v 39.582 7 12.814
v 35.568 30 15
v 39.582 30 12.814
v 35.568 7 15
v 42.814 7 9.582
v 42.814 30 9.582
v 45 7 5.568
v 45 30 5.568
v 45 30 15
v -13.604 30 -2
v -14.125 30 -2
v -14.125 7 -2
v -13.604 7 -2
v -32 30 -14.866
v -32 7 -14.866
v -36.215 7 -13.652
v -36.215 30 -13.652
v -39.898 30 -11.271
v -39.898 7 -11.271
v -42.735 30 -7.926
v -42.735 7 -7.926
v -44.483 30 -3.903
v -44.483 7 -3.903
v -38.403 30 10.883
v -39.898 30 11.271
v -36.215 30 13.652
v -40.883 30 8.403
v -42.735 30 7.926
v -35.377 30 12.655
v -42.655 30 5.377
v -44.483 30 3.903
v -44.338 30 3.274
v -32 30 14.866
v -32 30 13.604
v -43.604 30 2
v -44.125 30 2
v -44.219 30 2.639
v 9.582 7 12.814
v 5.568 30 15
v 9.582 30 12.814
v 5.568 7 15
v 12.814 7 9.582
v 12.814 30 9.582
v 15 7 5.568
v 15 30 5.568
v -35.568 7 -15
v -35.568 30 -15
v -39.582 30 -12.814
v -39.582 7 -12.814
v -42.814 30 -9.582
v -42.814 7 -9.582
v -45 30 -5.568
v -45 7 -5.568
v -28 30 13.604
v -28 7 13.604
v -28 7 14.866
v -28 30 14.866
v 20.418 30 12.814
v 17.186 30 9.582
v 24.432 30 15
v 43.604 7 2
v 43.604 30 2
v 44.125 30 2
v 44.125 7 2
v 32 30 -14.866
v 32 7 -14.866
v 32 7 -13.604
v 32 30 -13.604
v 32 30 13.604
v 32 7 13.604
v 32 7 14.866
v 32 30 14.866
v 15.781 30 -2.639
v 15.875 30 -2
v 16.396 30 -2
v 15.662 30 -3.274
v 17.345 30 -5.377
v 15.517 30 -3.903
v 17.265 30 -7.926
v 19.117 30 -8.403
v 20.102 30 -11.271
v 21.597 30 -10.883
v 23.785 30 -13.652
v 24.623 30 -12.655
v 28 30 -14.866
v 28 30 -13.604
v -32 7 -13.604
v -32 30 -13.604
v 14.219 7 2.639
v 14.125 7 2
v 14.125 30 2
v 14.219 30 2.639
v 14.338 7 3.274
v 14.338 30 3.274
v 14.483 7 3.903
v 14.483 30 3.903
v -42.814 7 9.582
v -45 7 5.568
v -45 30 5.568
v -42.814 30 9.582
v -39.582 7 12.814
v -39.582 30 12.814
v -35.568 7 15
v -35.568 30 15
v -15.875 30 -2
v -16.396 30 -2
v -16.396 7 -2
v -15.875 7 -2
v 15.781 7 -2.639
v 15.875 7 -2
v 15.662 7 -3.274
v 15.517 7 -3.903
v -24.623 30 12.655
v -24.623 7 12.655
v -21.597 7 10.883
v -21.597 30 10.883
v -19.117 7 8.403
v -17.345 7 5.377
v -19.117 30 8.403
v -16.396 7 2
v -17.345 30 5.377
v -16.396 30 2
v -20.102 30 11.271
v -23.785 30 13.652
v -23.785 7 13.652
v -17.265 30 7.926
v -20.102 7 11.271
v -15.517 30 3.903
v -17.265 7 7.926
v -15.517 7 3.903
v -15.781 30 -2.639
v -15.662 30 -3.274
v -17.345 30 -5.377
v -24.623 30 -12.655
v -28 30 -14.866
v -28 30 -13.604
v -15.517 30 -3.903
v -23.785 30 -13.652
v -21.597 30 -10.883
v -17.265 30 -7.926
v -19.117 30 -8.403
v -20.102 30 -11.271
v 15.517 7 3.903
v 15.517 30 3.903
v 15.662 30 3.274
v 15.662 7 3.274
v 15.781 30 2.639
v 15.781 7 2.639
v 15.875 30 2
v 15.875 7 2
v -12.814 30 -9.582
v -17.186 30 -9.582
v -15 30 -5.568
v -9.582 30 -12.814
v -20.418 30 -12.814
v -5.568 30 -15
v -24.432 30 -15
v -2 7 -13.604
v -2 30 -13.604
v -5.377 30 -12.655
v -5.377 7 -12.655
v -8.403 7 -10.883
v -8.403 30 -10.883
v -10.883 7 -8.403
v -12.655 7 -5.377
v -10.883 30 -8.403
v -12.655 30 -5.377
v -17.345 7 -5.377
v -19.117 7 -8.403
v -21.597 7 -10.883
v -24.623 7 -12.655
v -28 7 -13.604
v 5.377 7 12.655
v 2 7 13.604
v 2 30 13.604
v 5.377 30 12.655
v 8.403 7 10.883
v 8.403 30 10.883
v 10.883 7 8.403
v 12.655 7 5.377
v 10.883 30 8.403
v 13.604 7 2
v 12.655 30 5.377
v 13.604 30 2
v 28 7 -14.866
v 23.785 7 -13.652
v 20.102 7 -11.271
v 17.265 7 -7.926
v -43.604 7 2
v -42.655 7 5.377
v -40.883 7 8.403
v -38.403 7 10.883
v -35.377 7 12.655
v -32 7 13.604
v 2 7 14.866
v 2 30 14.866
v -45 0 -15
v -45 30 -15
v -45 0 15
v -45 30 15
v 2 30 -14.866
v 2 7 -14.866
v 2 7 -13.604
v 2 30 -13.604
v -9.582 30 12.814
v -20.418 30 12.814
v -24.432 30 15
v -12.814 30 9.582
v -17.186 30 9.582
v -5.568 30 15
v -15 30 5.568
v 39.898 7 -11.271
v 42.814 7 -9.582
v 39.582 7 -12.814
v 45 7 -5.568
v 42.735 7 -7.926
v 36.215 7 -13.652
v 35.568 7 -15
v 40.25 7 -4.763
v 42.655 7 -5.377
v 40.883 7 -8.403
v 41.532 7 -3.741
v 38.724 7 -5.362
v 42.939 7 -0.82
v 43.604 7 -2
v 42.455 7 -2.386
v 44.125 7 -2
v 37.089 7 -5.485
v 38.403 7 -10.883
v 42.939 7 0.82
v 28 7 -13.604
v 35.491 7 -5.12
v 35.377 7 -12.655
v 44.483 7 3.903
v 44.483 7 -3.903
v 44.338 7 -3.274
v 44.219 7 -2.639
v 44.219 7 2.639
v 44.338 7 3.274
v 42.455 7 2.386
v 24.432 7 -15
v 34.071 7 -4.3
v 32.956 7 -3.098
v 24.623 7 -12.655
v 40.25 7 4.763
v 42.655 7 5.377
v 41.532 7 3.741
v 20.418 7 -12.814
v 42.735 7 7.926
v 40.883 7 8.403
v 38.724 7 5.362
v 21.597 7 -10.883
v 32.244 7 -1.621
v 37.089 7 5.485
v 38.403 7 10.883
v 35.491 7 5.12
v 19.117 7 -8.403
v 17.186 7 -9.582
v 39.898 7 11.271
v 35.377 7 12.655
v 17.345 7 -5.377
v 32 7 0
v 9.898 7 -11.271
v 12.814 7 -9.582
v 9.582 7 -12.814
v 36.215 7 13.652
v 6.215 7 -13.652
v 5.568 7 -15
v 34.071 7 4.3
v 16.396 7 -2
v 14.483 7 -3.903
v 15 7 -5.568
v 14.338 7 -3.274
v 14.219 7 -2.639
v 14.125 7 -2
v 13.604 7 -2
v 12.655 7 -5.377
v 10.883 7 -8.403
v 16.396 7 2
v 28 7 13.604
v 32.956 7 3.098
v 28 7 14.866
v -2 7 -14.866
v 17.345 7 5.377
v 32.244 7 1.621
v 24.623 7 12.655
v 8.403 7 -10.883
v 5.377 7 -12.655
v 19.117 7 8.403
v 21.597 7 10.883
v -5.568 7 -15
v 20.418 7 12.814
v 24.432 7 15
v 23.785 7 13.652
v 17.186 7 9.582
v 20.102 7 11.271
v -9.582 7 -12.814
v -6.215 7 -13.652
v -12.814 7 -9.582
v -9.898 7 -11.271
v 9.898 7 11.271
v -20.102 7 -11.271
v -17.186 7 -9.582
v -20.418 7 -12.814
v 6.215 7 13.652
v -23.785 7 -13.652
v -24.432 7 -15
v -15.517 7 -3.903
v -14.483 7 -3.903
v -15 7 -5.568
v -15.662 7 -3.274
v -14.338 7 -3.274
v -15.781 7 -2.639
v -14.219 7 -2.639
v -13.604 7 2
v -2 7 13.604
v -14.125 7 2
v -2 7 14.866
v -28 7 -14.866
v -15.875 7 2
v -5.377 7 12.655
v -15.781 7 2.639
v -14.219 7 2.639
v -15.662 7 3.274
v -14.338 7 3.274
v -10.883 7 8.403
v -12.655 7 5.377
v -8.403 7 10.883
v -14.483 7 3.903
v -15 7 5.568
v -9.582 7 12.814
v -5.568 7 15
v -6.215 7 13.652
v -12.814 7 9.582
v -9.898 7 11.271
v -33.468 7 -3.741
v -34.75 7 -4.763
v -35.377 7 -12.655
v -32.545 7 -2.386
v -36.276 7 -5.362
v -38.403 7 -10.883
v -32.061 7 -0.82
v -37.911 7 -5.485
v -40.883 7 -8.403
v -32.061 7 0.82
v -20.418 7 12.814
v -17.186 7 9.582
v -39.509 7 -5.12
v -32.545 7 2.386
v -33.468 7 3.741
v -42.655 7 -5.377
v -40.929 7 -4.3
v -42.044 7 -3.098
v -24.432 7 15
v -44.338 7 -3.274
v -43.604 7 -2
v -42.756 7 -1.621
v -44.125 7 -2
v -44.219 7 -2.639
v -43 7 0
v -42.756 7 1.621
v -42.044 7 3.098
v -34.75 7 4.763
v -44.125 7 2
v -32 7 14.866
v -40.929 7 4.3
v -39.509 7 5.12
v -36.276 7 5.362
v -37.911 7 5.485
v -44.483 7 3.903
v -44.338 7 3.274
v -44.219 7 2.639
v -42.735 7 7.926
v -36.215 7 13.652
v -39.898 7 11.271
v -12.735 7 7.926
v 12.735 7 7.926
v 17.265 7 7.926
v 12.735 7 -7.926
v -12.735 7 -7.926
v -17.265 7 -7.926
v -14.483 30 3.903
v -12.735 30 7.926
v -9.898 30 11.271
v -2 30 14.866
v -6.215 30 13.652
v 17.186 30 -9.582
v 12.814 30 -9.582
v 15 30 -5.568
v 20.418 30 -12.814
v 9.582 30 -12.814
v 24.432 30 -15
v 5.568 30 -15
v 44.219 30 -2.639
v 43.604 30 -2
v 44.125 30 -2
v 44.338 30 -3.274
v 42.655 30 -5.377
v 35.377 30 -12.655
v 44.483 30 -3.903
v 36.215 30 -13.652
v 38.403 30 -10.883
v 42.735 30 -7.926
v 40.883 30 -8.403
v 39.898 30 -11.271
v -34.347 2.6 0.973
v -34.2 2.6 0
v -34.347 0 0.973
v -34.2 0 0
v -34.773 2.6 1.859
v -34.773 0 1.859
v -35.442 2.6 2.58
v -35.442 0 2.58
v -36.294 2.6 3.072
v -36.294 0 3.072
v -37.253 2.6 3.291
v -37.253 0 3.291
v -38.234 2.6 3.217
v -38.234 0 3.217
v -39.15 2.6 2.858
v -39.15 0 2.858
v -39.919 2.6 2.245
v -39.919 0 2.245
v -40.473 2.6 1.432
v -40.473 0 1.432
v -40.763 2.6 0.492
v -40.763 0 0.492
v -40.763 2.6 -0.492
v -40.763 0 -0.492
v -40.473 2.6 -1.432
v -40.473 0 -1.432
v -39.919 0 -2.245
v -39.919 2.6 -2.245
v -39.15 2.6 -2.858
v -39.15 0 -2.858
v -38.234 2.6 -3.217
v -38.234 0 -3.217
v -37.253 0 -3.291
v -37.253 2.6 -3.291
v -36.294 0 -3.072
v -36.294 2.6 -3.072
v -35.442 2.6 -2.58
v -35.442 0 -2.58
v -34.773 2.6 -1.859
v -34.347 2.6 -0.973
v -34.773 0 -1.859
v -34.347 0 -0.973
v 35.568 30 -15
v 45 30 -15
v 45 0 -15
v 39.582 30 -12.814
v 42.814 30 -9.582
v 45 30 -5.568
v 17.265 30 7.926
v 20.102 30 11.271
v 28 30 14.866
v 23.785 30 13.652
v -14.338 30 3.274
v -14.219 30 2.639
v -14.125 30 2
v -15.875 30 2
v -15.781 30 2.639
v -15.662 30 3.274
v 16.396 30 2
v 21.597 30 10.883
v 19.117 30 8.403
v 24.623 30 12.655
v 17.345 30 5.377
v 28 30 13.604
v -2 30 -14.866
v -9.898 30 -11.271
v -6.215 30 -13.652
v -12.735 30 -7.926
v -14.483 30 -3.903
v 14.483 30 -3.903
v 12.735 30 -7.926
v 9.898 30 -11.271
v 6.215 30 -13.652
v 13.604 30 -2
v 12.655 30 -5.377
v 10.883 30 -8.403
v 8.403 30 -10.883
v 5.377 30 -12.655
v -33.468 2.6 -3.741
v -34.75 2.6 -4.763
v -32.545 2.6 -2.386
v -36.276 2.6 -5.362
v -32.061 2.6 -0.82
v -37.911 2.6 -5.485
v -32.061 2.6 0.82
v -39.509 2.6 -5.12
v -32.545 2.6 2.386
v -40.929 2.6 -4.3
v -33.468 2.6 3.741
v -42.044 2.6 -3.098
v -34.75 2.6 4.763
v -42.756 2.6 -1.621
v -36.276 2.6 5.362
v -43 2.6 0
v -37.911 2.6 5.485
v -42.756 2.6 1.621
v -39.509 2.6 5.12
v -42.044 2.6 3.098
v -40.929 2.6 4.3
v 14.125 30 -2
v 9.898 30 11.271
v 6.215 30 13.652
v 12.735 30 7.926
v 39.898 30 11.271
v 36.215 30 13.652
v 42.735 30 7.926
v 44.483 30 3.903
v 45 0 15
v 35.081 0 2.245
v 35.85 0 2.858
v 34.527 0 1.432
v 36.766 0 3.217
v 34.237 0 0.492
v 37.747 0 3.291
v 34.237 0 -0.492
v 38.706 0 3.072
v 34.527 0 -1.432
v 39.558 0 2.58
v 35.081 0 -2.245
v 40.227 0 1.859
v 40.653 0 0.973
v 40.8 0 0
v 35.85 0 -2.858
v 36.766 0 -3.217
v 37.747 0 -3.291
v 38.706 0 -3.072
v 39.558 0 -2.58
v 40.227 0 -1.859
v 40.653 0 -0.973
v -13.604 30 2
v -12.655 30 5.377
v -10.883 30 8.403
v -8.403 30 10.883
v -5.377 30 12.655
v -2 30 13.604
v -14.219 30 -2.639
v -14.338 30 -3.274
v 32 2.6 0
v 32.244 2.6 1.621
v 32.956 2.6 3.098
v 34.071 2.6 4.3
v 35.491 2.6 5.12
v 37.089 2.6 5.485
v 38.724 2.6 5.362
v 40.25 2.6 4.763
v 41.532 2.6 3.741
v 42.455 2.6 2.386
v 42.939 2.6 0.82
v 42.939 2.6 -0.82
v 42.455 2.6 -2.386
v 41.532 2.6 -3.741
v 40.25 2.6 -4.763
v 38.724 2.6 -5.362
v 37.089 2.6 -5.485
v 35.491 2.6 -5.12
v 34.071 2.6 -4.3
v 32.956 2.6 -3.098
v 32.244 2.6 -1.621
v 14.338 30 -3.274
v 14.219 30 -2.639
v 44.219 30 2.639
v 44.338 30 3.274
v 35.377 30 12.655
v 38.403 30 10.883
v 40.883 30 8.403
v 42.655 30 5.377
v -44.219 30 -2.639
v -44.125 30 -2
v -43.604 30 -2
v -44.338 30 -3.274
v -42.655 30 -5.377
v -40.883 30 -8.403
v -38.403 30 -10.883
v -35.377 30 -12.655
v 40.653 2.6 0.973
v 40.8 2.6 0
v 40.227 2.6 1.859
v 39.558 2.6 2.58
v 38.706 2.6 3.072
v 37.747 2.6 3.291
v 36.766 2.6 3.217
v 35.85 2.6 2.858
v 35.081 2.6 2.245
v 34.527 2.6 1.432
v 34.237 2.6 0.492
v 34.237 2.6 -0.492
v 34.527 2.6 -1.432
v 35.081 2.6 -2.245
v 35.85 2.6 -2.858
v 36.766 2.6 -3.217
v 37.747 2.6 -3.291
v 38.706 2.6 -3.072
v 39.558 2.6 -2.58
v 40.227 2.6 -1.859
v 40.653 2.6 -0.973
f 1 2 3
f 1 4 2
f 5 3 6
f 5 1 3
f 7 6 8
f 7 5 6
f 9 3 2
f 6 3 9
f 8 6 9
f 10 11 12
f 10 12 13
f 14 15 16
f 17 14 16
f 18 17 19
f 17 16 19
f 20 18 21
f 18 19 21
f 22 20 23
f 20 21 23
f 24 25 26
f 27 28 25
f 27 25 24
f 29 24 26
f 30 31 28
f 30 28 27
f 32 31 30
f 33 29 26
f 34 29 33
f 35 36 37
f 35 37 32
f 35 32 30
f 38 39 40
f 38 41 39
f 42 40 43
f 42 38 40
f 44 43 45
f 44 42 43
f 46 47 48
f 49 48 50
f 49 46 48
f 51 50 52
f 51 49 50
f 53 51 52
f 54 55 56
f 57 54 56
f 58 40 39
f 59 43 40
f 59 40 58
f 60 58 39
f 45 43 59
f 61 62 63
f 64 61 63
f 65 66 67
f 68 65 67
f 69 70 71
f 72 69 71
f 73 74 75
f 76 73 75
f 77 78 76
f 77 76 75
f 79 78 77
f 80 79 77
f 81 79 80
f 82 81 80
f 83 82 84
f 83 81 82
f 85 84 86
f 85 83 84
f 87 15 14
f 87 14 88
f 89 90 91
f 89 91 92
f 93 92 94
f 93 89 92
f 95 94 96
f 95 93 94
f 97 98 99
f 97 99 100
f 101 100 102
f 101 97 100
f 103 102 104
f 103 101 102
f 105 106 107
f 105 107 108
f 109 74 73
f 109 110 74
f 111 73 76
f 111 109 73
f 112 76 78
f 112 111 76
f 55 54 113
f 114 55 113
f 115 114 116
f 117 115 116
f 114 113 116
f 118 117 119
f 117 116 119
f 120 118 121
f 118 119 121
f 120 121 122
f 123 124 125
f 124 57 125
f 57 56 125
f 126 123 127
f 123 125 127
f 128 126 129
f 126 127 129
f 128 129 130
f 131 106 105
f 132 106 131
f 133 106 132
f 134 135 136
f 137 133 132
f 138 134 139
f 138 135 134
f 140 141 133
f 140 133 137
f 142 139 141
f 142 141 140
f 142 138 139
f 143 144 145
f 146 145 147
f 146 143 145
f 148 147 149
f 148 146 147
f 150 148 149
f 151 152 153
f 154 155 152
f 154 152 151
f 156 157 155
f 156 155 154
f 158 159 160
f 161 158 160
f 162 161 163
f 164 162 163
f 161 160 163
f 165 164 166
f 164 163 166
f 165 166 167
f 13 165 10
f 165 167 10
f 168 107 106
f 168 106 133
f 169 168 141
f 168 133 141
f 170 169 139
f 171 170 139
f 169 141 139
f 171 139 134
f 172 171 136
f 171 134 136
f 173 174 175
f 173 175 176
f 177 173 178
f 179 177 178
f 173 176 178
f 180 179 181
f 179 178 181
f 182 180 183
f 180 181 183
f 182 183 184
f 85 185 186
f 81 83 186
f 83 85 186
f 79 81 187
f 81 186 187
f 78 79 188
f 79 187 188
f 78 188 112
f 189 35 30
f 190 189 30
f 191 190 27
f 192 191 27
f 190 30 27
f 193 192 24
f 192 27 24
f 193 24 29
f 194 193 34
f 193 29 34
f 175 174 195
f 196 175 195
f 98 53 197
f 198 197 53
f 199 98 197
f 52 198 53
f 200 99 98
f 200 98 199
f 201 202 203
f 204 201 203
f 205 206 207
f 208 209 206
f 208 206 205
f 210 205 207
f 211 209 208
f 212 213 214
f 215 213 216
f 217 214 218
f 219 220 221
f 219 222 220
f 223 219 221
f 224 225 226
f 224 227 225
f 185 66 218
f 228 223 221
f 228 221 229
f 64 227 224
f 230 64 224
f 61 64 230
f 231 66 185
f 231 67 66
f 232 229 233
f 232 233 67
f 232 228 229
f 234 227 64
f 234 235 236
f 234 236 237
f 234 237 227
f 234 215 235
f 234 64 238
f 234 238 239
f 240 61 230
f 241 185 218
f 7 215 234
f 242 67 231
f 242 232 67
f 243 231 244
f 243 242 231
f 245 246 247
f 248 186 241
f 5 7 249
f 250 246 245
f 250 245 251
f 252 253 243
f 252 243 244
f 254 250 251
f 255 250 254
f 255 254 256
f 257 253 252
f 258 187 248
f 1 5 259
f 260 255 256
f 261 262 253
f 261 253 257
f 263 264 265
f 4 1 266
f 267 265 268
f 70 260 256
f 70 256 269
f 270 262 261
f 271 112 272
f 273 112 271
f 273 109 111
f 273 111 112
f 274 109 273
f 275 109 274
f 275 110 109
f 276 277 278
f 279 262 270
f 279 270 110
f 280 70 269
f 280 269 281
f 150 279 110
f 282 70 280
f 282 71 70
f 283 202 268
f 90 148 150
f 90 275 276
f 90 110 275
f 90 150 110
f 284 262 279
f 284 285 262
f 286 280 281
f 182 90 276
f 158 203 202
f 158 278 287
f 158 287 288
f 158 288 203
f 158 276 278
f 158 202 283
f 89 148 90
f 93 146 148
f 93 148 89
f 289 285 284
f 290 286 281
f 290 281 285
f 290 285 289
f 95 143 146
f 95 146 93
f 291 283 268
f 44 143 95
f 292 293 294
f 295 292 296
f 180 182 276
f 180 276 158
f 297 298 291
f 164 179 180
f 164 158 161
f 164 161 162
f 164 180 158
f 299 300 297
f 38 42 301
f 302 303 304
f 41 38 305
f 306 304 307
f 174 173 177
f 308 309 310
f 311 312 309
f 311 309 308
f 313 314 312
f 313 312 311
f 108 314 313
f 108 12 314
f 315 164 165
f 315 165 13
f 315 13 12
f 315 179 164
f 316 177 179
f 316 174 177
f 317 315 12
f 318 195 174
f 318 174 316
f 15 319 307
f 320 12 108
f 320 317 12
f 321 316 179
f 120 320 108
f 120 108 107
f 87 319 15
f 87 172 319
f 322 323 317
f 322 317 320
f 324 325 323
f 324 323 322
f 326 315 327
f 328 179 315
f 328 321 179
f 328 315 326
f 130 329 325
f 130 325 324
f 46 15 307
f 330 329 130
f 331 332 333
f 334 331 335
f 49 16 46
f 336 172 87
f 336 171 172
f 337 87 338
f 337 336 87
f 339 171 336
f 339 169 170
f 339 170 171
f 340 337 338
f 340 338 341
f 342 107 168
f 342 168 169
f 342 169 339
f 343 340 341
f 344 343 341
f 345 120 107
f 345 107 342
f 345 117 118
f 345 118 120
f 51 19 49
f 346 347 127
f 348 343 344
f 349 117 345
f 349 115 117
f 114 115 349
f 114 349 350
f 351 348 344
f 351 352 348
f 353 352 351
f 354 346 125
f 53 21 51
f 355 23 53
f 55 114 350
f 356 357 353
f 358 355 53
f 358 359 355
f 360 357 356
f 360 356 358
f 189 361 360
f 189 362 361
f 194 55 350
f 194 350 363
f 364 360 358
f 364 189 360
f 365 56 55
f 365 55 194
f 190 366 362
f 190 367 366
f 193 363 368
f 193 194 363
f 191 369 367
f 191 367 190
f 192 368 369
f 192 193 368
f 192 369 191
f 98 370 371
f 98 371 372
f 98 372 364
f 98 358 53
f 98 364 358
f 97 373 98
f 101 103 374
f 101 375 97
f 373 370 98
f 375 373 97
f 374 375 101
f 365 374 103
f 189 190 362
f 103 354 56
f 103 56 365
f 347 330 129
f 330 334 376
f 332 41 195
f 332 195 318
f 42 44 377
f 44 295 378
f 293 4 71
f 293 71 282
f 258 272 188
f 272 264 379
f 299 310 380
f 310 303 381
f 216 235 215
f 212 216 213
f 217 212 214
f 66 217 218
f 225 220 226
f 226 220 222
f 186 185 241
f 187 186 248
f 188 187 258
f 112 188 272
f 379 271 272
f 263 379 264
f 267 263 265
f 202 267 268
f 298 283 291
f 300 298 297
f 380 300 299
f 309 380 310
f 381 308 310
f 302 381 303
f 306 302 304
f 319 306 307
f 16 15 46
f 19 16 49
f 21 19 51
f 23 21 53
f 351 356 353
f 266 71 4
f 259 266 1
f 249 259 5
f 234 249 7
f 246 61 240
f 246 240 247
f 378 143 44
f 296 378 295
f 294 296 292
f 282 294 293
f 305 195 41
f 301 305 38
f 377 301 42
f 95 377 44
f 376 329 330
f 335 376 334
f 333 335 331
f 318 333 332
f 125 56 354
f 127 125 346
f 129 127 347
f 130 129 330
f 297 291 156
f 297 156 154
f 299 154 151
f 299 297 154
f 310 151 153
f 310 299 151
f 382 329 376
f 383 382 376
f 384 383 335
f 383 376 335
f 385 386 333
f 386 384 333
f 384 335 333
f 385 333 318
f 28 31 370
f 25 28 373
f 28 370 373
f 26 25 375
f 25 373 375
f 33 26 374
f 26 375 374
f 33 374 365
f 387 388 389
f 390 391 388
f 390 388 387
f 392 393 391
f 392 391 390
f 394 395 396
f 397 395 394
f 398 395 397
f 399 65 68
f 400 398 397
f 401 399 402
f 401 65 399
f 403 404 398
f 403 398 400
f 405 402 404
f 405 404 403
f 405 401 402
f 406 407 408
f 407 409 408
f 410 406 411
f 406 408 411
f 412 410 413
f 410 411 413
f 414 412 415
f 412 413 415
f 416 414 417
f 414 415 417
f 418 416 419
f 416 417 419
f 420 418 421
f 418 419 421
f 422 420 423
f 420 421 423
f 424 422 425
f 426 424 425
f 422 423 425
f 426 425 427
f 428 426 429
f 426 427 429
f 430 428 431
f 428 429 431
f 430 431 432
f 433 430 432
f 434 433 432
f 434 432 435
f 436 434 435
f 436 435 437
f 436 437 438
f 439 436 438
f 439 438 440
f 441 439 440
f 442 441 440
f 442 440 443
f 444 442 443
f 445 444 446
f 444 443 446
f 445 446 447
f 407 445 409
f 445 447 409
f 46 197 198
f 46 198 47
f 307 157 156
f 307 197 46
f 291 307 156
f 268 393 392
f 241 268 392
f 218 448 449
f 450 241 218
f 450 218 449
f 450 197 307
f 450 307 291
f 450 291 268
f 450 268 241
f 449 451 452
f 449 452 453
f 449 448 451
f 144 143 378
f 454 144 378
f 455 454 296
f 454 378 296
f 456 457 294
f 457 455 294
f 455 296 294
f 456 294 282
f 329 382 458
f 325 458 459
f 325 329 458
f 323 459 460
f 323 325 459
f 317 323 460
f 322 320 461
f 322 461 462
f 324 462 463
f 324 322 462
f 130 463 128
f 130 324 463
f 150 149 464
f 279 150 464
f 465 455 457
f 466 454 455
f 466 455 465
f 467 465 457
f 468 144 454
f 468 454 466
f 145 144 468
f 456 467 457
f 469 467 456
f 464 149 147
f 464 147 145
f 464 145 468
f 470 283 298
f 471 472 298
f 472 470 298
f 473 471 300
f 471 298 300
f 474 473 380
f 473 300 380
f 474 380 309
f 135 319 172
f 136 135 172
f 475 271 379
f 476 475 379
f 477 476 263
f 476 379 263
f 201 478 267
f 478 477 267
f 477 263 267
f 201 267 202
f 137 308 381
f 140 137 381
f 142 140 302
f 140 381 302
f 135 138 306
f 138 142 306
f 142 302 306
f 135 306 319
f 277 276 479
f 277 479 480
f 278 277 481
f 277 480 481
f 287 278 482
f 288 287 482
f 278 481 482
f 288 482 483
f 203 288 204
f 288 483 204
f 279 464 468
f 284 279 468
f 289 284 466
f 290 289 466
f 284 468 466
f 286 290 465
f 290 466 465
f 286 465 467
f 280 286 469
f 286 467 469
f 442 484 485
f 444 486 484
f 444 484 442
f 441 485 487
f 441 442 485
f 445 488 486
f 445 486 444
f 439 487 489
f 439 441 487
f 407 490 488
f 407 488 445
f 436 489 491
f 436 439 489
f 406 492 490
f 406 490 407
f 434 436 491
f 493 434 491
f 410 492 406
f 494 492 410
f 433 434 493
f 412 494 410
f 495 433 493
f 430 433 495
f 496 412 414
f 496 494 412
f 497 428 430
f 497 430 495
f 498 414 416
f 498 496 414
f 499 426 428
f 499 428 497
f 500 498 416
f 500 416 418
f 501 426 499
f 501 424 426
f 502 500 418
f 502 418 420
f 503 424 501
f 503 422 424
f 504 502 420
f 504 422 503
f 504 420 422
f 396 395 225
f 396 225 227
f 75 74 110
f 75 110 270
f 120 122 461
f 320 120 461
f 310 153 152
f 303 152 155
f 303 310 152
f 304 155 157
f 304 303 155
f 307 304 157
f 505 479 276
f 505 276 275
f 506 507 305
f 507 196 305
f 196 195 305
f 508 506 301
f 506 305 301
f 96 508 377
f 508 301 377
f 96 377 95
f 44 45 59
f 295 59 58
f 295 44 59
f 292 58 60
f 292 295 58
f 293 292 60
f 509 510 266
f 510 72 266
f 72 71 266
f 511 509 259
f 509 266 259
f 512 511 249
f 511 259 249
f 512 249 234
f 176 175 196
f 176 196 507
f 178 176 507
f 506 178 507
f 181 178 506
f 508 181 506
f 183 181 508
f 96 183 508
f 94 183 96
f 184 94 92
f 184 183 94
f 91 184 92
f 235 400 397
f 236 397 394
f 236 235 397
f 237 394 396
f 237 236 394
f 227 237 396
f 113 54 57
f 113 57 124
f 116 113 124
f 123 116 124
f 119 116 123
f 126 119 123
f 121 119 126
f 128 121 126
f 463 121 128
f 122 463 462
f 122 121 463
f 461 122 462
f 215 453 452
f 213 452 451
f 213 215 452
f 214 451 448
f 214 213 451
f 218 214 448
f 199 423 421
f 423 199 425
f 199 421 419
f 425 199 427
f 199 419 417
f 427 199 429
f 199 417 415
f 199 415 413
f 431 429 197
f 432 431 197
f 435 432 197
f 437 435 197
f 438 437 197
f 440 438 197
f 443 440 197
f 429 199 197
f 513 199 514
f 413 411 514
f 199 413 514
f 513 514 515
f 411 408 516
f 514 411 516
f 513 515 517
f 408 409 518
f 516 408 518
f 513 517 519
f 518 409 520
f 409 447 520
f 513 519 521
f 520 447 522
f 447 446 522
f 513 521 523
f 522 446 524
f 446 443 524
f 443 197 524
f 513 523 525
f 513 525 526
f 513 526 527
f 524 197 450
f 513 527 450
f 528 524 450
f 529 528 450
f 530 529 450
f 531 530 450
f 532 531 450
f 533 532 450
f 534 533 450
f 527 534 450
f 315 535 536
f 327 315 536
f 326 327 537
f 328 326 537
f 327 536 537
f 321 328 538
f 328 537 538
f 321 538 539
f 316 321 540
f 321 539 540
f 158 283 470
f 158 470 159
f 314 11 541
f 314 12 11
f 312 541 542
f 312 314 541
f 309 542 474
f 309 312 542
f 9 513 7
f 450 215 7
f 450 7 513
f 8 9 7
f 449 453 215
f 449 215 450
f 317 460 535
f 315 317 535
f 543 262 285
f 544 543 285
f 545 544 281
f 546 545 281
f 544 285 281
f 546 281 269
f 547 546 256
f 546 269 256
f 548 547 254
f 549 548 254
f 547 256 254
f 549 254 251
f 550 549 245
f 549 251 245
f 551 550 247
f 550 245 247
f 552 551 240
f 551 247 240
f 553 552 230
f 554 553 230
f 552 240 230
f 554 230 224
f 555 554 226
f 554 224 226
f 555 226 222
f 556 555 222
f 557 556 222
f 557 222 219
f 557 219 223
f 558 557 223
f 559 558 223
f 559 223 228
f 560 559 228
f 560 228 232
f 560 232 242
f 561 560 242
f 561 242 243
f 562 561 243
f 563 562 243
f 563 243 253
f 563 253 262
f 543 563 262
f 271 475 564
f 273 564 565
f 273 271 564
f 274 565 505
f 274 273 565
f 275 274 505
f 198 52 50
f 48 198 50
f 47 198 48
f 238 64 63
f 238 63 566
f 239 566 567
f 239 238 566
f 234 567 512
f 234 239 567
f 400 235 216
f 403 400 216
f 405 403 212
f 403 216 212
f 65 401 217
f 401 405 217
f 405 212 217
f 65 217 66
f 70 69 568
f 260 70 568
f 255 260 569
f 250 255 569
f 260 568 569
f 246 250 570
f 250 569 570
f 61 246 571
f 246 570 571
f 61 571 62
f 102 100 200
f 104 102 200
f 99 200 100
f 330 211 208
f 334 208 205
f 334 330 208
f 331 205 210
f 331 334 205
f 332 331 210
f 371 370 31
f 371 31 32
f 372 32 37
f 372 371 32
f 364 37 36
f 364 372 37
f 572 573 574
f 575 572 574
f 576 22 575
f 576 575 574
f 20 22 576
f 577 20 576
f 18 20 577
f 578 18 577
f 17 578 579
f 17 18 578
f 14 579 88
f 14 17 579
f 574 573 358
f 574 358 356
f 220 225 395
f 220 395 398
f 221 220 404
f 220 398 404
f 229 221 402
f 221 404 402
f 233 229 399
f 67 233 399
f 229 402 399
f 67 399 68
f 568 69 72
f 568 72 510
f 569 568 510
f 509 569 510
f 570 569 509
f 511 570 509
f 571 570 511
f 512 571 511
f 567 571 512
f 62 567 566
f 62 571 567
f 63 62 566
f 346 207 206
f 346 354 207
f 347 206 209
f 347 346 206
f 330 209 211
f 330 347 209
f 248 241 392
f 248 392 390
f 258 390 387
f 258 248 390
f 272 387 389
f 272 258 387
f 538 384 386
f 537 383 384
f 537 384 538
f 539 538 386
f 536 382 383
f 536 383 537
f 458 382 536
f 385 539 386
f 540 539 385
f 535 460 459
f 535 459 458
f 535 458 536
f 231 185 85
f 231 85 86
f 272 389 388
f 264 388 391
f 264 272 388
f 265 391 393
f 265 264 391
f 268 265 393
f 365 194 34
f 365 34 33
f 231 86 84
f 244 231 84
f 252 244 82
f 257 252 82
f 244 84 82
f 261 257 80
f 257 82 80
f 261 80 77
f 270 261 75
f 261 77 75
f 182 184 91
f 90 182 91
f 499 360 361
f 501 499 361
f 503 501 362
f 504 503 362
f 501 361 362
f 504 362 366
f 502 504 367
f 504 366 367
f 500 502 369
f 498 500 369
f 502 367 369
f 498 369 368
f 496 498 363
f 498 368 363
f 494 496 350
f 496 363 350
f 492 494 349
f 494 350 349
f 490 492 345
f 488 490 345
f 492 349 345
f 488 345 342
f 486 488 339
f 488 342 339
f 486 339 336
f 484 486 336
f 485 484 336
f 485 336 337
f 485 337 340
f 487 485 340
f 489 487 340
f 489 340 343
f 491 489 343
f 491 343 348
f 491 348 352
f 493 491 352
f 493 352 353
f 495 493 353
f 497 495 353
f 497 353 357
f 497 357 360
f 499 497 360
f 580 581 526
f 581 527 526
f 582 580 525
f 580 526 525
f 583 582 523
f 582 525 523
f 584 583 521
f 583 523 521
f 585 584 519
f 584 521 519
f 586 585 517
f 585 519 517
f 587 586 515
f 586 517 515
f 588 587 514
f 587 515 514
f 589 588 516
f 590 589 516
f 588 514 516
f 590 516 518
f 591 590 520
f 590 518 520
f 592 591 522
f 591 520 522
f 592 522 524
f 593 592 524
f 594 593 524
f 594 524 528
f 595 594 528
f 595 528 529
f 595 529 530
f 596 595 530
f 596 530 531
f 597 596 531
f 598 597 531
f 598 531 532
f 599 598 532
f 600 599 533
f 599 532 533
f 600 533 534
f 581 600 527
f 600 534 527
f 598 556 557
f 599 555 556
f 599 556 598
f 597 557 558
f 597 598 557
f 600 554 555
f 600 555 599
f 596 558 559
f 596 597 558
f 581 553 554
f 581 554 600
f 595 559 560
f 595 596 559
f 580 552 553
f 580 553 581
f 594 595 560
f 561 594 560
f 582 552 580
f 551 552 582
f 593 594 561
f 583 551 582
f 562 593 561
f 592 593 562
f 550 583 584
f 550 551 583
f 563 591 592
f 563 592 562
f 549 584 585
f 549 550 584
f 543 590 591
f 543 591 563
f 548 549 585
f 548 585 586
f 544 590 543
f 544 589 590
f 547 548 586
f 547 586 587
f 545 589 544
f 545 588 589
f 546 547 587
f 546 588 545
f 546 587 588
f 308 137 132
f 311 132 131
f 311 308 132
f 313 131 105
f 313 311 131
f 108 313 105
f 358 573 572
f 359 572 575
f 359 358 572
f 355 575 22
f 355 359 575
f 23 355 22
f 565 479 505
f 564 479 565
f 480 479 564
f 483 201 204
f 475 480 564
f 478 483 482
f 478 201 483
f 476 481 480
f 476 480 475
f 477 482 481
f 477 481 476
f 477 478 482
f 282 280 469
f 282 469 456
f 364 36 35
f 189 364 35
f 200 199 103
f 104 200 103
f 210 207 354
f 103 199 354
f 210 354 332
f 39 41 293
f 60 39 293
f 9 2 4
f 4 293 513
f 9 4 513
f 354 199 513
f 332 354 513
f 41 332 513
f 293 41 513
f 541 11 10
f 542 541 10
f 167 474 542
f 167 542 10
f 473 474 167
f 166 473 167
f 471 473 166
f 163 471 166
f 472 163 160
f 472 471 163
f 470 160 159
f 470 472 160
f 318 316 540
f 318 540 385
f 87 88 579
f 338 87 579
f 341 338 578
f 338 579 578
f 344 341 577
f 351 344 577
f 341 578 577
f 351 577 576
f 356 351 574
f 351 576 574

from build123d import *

# Parameters (mm, degrees)
SKETCH2_W                                           = 150
SKETCH2_H                                           = 30
BOSS_EXTRUDE1_DEPTH                                 = 30
SKETCH3_R                                           = 13.75
CUT_EXTRUDE1_DEPTH                                  = 23
LPATTERN1_COUNT                                     = 5
LPATTERN1_PITCH                                     = 30
CBORE_FOR_M4_HEX_SOCKET_HEAD_CAP_SCREW1_D           = 4.5
CBORE_FOR_M4_HEX_SOCKET_HEAD_CAP_SCREW1_CBORE_D     = 8
CBORE_FOR_M4_HEX_SOCKET_HEAD_CAP_SCREW1_CBORE_DEPTH = 4.4
LPATTERN2_COUNT                                     = 2
LPATTERN2_PITCH                                     = 120
SKETCH7_W                                           = 181.12901383
SKETCH7_H                                           = 4
CUT_EXTRUDE3_DEPTH                                  = 23
SKETCH8_W                                           = 4
SKETCH8_H                                           = 50
CUT_EXTRUDE4_DEPTH                                  = 23
SKIZZE1_R                                           = 16
SKIZZE1_R_2                                         = 15
SCHNITT_LINEAR_AUSTRAGEN1_DEPTH                     = 80.868642157
LPATTERN3_COUNT                                     = 5
LPATTERN3_PITCH                                     = 30
CBORE_FOR_M6_HEX_SOCKET_HEAD_CAP_SCREW1_D           = 6.6
CBORE_FOR_M6_HEX_SOCKET_HEAD_CAP_SCREW1_CBORE_D     = 11
CBORE_FOR_M6_HEX_SOCKET_HEAD_CAP_SCREW1_CBORE_DEPTH = 4.4
LPATTERN4_COUNT                                     = 2
LPATTERN4_PITCH                                     = 75
SKIZZE2_W                                           = 30
SKIZZE2_H                                           = 30
SCHNITT_LINEAR_AUSTRAGEN2_DEPTH                     = 30
SKIZZE3_W                                           = 30
SKIZZE3_H                                           = 30
SCHNITT_LINEAR_AUSTRAGEN3_DEPTH                     = 30


with BuildPart() as part:
    # Sketch2 → Boss-Extrude1 (new body)
    with BuildSketch(Plane(origin=(0, 0, 0), x_dir=(1, 0, 0), z_dir=(0, 1, 0))):
        Rectangle(SKETCH2_W, SKETCH2_H)
    extrude(amount=BOSS_EXTRUDE1_DEPTH)

    # Sketch3 → Cut-Extrude1 (cut)
    with BuildSketch(Plane(origin=(0, 30, 0), x_dir=(1, 0, 0), z_dir=(0, 1, 0))):
        with Locations(Location((-60, 0, 0), (0, 0, 270))):
            Circle(SKETCH3_R)
    cut_extrude1 = extrude(amount=-CUT_EXTRUDE1_DEPTH, mode=Mode.SUBTRACT)

    # LPattern1: Cut-Extrude1 ×5
    with Locations(*[(i * LPATTERN1_PITCH, 0, 0) for i in range(1, LPATTERN1_COUNT)]):
        add(cut_extrude1, mode=Mode.SUBTRACT)

    # CBORE for M4 Hex Socket Head Cap Screw1 (through all)
    with Locations(Plane(origin=(0, 7, 0), x_dir=(-1, 0, 0), z_dir=(0, 1, 0))):
        with Locations((60, 0)):
            cbore_for_m4_hex_socket_head_cap_screw1 = CounterBoreHole(CBORE_FOR_M4_HEX_SOCKET_HEAD_CAP_SCREW1_D / 2, CBORE_FOR_M4_HEX_SOCKET_HEAD_CAP_SCREW1_CBORE_D / 2, CBORE_FOR_M4_HEX_SOCKET_HEAD_CAP_SCREW1_CBORE_DEPTH)

    # LPattern2: CBORE for M4 Hex Socket Head Cap Screw1 ×2
    with Locations(*[(i * LPATTERN2_PITCH, 0, 0) for i in range(1, LPATTERN2_COUNT)]):
        add(cbore_for_m4_hex_socket_head_cap_screw1, mode=Mode.SUBTRACT)

    # Sketch7 → Cut-Extrude3 (cut)
    with BuildSketch(Plane(origin=(0, 30, 0), x_dir=(1, 0, 0), z_dir=(0, 1, 0))):
        Rectangle(SKETCH7_W, SKETCH7_H)
    extrude(amount=-CUT_EXTRUDE3_DEPTH, mode=Mode.SUBTRACT)

    # Sketch8 → Cut-Extrude4 (cut)
    with BuildSketch(Plane(origin=(0, 30, 0), x_dir=(-1, 0, 0), z_dir=(0, 1, 0))):
        with Locations((60, -1.298701607)):
            Rectangle(SKETCH8_W, SKETCH8_H)
    cut_extrude4 = extrude(amount=-CUT_EXTRUDE4_DEPTH, mode=Mode.SUBTRACT)

    # Skizze1 → Schnitt-Linear austragen1 (cut, through all)
    with BuildSketch(Plane(origin=(0, 7, 0), x_dir=(-1, 0, 0), z_dir=(0, 1, 0))):
        with Locations((60, 0)):
            Circle(SKIZZE1_R)
        with Locations((60, 0)):
            Circle(SKIZZE1_R_2, mode=Mode.SUBTRACT)
    schnitt_linear_austragen1 = extrude(amount=SCHNITT_LINEAR_AUSTRAGEN1_DEPTH, mode=Mode.SUBTRACT)

    # LPattern3: Cut-Extrude4, Schnitt-Linear austragen1 ×5
    with Locations(*[(i * LPATTERN3_PITCH, 0, 0) for i in range(1, LPATTERN3_COUNT)]):
        add(cut_extrude4, mode=Mode.SUBTRACT)
        add(schnitt_linear_austragen1, mode=Mode.SUBTRACT)

    # CBORE for M6 Hex Socket Head Cap Screw1 (through all)
    with Locations(Plane(origin=(0, 7, 0), x_dir=(-1, 0, 0), z_dir=(0, 1, 0))):
        with Locations((37.5, 0)):
            cbore_for_m6_hex_socket_head_cap_screw1 = CounterBoreHole(CBORE_FOR_M6_HEX_SOCKET_HEAD_CAP_SCREW1_D / 2, CBORE_FOR_M6_HEX_SOCKET_HEAD_CAP_SCREW1_CBORE_D / 2, CBORE_FOR_M6_HEX_SOCKET_HEAD_CAP_SCREW1_CBORE_DEPTH)

    # LPattern4: CBORE for M6 Hex Socket Head Cap Screw1 ×2
    with Locations(*[(i * LPATTERN4_PITCH, 0, 0) for i in range(1, LPATTERN4_COUNT)]):
        add(cbore_for_m6_hex_socket_head_cap_screw1, mode=Mode.SUBTRACT)

    # Skizze2 → Schnitt-Linear austragen2 (cut)
    with BuildSketch(Plane.ZY.offset(75)):
        with Locations((0, 15)):
            Rectangle(SKIZZE2_W, SKIZZE2_H)
    extrude(amount=-SCHNITT_LINEAR_AUSTRAGEN2_DEPTH, mode=Mode.SUBTRACT)

    # Skizze3 → Schnitt-Linear austragen3 (cut)
    with BuildSketch(Plane(origin=(75, 0, 0), x_dir=(0, 0, -1), z_dir=(1, 0, 0))):
        with Locations((0, 15)):
            Rectangle(SKIZZE3_W, SKIZZE3_H)
    extrude(amount=-SCHNITT_LINEAR_AUSTRAGEN3_DEPTH, mode=Mode.SUBTRACT)


solid = part.part
